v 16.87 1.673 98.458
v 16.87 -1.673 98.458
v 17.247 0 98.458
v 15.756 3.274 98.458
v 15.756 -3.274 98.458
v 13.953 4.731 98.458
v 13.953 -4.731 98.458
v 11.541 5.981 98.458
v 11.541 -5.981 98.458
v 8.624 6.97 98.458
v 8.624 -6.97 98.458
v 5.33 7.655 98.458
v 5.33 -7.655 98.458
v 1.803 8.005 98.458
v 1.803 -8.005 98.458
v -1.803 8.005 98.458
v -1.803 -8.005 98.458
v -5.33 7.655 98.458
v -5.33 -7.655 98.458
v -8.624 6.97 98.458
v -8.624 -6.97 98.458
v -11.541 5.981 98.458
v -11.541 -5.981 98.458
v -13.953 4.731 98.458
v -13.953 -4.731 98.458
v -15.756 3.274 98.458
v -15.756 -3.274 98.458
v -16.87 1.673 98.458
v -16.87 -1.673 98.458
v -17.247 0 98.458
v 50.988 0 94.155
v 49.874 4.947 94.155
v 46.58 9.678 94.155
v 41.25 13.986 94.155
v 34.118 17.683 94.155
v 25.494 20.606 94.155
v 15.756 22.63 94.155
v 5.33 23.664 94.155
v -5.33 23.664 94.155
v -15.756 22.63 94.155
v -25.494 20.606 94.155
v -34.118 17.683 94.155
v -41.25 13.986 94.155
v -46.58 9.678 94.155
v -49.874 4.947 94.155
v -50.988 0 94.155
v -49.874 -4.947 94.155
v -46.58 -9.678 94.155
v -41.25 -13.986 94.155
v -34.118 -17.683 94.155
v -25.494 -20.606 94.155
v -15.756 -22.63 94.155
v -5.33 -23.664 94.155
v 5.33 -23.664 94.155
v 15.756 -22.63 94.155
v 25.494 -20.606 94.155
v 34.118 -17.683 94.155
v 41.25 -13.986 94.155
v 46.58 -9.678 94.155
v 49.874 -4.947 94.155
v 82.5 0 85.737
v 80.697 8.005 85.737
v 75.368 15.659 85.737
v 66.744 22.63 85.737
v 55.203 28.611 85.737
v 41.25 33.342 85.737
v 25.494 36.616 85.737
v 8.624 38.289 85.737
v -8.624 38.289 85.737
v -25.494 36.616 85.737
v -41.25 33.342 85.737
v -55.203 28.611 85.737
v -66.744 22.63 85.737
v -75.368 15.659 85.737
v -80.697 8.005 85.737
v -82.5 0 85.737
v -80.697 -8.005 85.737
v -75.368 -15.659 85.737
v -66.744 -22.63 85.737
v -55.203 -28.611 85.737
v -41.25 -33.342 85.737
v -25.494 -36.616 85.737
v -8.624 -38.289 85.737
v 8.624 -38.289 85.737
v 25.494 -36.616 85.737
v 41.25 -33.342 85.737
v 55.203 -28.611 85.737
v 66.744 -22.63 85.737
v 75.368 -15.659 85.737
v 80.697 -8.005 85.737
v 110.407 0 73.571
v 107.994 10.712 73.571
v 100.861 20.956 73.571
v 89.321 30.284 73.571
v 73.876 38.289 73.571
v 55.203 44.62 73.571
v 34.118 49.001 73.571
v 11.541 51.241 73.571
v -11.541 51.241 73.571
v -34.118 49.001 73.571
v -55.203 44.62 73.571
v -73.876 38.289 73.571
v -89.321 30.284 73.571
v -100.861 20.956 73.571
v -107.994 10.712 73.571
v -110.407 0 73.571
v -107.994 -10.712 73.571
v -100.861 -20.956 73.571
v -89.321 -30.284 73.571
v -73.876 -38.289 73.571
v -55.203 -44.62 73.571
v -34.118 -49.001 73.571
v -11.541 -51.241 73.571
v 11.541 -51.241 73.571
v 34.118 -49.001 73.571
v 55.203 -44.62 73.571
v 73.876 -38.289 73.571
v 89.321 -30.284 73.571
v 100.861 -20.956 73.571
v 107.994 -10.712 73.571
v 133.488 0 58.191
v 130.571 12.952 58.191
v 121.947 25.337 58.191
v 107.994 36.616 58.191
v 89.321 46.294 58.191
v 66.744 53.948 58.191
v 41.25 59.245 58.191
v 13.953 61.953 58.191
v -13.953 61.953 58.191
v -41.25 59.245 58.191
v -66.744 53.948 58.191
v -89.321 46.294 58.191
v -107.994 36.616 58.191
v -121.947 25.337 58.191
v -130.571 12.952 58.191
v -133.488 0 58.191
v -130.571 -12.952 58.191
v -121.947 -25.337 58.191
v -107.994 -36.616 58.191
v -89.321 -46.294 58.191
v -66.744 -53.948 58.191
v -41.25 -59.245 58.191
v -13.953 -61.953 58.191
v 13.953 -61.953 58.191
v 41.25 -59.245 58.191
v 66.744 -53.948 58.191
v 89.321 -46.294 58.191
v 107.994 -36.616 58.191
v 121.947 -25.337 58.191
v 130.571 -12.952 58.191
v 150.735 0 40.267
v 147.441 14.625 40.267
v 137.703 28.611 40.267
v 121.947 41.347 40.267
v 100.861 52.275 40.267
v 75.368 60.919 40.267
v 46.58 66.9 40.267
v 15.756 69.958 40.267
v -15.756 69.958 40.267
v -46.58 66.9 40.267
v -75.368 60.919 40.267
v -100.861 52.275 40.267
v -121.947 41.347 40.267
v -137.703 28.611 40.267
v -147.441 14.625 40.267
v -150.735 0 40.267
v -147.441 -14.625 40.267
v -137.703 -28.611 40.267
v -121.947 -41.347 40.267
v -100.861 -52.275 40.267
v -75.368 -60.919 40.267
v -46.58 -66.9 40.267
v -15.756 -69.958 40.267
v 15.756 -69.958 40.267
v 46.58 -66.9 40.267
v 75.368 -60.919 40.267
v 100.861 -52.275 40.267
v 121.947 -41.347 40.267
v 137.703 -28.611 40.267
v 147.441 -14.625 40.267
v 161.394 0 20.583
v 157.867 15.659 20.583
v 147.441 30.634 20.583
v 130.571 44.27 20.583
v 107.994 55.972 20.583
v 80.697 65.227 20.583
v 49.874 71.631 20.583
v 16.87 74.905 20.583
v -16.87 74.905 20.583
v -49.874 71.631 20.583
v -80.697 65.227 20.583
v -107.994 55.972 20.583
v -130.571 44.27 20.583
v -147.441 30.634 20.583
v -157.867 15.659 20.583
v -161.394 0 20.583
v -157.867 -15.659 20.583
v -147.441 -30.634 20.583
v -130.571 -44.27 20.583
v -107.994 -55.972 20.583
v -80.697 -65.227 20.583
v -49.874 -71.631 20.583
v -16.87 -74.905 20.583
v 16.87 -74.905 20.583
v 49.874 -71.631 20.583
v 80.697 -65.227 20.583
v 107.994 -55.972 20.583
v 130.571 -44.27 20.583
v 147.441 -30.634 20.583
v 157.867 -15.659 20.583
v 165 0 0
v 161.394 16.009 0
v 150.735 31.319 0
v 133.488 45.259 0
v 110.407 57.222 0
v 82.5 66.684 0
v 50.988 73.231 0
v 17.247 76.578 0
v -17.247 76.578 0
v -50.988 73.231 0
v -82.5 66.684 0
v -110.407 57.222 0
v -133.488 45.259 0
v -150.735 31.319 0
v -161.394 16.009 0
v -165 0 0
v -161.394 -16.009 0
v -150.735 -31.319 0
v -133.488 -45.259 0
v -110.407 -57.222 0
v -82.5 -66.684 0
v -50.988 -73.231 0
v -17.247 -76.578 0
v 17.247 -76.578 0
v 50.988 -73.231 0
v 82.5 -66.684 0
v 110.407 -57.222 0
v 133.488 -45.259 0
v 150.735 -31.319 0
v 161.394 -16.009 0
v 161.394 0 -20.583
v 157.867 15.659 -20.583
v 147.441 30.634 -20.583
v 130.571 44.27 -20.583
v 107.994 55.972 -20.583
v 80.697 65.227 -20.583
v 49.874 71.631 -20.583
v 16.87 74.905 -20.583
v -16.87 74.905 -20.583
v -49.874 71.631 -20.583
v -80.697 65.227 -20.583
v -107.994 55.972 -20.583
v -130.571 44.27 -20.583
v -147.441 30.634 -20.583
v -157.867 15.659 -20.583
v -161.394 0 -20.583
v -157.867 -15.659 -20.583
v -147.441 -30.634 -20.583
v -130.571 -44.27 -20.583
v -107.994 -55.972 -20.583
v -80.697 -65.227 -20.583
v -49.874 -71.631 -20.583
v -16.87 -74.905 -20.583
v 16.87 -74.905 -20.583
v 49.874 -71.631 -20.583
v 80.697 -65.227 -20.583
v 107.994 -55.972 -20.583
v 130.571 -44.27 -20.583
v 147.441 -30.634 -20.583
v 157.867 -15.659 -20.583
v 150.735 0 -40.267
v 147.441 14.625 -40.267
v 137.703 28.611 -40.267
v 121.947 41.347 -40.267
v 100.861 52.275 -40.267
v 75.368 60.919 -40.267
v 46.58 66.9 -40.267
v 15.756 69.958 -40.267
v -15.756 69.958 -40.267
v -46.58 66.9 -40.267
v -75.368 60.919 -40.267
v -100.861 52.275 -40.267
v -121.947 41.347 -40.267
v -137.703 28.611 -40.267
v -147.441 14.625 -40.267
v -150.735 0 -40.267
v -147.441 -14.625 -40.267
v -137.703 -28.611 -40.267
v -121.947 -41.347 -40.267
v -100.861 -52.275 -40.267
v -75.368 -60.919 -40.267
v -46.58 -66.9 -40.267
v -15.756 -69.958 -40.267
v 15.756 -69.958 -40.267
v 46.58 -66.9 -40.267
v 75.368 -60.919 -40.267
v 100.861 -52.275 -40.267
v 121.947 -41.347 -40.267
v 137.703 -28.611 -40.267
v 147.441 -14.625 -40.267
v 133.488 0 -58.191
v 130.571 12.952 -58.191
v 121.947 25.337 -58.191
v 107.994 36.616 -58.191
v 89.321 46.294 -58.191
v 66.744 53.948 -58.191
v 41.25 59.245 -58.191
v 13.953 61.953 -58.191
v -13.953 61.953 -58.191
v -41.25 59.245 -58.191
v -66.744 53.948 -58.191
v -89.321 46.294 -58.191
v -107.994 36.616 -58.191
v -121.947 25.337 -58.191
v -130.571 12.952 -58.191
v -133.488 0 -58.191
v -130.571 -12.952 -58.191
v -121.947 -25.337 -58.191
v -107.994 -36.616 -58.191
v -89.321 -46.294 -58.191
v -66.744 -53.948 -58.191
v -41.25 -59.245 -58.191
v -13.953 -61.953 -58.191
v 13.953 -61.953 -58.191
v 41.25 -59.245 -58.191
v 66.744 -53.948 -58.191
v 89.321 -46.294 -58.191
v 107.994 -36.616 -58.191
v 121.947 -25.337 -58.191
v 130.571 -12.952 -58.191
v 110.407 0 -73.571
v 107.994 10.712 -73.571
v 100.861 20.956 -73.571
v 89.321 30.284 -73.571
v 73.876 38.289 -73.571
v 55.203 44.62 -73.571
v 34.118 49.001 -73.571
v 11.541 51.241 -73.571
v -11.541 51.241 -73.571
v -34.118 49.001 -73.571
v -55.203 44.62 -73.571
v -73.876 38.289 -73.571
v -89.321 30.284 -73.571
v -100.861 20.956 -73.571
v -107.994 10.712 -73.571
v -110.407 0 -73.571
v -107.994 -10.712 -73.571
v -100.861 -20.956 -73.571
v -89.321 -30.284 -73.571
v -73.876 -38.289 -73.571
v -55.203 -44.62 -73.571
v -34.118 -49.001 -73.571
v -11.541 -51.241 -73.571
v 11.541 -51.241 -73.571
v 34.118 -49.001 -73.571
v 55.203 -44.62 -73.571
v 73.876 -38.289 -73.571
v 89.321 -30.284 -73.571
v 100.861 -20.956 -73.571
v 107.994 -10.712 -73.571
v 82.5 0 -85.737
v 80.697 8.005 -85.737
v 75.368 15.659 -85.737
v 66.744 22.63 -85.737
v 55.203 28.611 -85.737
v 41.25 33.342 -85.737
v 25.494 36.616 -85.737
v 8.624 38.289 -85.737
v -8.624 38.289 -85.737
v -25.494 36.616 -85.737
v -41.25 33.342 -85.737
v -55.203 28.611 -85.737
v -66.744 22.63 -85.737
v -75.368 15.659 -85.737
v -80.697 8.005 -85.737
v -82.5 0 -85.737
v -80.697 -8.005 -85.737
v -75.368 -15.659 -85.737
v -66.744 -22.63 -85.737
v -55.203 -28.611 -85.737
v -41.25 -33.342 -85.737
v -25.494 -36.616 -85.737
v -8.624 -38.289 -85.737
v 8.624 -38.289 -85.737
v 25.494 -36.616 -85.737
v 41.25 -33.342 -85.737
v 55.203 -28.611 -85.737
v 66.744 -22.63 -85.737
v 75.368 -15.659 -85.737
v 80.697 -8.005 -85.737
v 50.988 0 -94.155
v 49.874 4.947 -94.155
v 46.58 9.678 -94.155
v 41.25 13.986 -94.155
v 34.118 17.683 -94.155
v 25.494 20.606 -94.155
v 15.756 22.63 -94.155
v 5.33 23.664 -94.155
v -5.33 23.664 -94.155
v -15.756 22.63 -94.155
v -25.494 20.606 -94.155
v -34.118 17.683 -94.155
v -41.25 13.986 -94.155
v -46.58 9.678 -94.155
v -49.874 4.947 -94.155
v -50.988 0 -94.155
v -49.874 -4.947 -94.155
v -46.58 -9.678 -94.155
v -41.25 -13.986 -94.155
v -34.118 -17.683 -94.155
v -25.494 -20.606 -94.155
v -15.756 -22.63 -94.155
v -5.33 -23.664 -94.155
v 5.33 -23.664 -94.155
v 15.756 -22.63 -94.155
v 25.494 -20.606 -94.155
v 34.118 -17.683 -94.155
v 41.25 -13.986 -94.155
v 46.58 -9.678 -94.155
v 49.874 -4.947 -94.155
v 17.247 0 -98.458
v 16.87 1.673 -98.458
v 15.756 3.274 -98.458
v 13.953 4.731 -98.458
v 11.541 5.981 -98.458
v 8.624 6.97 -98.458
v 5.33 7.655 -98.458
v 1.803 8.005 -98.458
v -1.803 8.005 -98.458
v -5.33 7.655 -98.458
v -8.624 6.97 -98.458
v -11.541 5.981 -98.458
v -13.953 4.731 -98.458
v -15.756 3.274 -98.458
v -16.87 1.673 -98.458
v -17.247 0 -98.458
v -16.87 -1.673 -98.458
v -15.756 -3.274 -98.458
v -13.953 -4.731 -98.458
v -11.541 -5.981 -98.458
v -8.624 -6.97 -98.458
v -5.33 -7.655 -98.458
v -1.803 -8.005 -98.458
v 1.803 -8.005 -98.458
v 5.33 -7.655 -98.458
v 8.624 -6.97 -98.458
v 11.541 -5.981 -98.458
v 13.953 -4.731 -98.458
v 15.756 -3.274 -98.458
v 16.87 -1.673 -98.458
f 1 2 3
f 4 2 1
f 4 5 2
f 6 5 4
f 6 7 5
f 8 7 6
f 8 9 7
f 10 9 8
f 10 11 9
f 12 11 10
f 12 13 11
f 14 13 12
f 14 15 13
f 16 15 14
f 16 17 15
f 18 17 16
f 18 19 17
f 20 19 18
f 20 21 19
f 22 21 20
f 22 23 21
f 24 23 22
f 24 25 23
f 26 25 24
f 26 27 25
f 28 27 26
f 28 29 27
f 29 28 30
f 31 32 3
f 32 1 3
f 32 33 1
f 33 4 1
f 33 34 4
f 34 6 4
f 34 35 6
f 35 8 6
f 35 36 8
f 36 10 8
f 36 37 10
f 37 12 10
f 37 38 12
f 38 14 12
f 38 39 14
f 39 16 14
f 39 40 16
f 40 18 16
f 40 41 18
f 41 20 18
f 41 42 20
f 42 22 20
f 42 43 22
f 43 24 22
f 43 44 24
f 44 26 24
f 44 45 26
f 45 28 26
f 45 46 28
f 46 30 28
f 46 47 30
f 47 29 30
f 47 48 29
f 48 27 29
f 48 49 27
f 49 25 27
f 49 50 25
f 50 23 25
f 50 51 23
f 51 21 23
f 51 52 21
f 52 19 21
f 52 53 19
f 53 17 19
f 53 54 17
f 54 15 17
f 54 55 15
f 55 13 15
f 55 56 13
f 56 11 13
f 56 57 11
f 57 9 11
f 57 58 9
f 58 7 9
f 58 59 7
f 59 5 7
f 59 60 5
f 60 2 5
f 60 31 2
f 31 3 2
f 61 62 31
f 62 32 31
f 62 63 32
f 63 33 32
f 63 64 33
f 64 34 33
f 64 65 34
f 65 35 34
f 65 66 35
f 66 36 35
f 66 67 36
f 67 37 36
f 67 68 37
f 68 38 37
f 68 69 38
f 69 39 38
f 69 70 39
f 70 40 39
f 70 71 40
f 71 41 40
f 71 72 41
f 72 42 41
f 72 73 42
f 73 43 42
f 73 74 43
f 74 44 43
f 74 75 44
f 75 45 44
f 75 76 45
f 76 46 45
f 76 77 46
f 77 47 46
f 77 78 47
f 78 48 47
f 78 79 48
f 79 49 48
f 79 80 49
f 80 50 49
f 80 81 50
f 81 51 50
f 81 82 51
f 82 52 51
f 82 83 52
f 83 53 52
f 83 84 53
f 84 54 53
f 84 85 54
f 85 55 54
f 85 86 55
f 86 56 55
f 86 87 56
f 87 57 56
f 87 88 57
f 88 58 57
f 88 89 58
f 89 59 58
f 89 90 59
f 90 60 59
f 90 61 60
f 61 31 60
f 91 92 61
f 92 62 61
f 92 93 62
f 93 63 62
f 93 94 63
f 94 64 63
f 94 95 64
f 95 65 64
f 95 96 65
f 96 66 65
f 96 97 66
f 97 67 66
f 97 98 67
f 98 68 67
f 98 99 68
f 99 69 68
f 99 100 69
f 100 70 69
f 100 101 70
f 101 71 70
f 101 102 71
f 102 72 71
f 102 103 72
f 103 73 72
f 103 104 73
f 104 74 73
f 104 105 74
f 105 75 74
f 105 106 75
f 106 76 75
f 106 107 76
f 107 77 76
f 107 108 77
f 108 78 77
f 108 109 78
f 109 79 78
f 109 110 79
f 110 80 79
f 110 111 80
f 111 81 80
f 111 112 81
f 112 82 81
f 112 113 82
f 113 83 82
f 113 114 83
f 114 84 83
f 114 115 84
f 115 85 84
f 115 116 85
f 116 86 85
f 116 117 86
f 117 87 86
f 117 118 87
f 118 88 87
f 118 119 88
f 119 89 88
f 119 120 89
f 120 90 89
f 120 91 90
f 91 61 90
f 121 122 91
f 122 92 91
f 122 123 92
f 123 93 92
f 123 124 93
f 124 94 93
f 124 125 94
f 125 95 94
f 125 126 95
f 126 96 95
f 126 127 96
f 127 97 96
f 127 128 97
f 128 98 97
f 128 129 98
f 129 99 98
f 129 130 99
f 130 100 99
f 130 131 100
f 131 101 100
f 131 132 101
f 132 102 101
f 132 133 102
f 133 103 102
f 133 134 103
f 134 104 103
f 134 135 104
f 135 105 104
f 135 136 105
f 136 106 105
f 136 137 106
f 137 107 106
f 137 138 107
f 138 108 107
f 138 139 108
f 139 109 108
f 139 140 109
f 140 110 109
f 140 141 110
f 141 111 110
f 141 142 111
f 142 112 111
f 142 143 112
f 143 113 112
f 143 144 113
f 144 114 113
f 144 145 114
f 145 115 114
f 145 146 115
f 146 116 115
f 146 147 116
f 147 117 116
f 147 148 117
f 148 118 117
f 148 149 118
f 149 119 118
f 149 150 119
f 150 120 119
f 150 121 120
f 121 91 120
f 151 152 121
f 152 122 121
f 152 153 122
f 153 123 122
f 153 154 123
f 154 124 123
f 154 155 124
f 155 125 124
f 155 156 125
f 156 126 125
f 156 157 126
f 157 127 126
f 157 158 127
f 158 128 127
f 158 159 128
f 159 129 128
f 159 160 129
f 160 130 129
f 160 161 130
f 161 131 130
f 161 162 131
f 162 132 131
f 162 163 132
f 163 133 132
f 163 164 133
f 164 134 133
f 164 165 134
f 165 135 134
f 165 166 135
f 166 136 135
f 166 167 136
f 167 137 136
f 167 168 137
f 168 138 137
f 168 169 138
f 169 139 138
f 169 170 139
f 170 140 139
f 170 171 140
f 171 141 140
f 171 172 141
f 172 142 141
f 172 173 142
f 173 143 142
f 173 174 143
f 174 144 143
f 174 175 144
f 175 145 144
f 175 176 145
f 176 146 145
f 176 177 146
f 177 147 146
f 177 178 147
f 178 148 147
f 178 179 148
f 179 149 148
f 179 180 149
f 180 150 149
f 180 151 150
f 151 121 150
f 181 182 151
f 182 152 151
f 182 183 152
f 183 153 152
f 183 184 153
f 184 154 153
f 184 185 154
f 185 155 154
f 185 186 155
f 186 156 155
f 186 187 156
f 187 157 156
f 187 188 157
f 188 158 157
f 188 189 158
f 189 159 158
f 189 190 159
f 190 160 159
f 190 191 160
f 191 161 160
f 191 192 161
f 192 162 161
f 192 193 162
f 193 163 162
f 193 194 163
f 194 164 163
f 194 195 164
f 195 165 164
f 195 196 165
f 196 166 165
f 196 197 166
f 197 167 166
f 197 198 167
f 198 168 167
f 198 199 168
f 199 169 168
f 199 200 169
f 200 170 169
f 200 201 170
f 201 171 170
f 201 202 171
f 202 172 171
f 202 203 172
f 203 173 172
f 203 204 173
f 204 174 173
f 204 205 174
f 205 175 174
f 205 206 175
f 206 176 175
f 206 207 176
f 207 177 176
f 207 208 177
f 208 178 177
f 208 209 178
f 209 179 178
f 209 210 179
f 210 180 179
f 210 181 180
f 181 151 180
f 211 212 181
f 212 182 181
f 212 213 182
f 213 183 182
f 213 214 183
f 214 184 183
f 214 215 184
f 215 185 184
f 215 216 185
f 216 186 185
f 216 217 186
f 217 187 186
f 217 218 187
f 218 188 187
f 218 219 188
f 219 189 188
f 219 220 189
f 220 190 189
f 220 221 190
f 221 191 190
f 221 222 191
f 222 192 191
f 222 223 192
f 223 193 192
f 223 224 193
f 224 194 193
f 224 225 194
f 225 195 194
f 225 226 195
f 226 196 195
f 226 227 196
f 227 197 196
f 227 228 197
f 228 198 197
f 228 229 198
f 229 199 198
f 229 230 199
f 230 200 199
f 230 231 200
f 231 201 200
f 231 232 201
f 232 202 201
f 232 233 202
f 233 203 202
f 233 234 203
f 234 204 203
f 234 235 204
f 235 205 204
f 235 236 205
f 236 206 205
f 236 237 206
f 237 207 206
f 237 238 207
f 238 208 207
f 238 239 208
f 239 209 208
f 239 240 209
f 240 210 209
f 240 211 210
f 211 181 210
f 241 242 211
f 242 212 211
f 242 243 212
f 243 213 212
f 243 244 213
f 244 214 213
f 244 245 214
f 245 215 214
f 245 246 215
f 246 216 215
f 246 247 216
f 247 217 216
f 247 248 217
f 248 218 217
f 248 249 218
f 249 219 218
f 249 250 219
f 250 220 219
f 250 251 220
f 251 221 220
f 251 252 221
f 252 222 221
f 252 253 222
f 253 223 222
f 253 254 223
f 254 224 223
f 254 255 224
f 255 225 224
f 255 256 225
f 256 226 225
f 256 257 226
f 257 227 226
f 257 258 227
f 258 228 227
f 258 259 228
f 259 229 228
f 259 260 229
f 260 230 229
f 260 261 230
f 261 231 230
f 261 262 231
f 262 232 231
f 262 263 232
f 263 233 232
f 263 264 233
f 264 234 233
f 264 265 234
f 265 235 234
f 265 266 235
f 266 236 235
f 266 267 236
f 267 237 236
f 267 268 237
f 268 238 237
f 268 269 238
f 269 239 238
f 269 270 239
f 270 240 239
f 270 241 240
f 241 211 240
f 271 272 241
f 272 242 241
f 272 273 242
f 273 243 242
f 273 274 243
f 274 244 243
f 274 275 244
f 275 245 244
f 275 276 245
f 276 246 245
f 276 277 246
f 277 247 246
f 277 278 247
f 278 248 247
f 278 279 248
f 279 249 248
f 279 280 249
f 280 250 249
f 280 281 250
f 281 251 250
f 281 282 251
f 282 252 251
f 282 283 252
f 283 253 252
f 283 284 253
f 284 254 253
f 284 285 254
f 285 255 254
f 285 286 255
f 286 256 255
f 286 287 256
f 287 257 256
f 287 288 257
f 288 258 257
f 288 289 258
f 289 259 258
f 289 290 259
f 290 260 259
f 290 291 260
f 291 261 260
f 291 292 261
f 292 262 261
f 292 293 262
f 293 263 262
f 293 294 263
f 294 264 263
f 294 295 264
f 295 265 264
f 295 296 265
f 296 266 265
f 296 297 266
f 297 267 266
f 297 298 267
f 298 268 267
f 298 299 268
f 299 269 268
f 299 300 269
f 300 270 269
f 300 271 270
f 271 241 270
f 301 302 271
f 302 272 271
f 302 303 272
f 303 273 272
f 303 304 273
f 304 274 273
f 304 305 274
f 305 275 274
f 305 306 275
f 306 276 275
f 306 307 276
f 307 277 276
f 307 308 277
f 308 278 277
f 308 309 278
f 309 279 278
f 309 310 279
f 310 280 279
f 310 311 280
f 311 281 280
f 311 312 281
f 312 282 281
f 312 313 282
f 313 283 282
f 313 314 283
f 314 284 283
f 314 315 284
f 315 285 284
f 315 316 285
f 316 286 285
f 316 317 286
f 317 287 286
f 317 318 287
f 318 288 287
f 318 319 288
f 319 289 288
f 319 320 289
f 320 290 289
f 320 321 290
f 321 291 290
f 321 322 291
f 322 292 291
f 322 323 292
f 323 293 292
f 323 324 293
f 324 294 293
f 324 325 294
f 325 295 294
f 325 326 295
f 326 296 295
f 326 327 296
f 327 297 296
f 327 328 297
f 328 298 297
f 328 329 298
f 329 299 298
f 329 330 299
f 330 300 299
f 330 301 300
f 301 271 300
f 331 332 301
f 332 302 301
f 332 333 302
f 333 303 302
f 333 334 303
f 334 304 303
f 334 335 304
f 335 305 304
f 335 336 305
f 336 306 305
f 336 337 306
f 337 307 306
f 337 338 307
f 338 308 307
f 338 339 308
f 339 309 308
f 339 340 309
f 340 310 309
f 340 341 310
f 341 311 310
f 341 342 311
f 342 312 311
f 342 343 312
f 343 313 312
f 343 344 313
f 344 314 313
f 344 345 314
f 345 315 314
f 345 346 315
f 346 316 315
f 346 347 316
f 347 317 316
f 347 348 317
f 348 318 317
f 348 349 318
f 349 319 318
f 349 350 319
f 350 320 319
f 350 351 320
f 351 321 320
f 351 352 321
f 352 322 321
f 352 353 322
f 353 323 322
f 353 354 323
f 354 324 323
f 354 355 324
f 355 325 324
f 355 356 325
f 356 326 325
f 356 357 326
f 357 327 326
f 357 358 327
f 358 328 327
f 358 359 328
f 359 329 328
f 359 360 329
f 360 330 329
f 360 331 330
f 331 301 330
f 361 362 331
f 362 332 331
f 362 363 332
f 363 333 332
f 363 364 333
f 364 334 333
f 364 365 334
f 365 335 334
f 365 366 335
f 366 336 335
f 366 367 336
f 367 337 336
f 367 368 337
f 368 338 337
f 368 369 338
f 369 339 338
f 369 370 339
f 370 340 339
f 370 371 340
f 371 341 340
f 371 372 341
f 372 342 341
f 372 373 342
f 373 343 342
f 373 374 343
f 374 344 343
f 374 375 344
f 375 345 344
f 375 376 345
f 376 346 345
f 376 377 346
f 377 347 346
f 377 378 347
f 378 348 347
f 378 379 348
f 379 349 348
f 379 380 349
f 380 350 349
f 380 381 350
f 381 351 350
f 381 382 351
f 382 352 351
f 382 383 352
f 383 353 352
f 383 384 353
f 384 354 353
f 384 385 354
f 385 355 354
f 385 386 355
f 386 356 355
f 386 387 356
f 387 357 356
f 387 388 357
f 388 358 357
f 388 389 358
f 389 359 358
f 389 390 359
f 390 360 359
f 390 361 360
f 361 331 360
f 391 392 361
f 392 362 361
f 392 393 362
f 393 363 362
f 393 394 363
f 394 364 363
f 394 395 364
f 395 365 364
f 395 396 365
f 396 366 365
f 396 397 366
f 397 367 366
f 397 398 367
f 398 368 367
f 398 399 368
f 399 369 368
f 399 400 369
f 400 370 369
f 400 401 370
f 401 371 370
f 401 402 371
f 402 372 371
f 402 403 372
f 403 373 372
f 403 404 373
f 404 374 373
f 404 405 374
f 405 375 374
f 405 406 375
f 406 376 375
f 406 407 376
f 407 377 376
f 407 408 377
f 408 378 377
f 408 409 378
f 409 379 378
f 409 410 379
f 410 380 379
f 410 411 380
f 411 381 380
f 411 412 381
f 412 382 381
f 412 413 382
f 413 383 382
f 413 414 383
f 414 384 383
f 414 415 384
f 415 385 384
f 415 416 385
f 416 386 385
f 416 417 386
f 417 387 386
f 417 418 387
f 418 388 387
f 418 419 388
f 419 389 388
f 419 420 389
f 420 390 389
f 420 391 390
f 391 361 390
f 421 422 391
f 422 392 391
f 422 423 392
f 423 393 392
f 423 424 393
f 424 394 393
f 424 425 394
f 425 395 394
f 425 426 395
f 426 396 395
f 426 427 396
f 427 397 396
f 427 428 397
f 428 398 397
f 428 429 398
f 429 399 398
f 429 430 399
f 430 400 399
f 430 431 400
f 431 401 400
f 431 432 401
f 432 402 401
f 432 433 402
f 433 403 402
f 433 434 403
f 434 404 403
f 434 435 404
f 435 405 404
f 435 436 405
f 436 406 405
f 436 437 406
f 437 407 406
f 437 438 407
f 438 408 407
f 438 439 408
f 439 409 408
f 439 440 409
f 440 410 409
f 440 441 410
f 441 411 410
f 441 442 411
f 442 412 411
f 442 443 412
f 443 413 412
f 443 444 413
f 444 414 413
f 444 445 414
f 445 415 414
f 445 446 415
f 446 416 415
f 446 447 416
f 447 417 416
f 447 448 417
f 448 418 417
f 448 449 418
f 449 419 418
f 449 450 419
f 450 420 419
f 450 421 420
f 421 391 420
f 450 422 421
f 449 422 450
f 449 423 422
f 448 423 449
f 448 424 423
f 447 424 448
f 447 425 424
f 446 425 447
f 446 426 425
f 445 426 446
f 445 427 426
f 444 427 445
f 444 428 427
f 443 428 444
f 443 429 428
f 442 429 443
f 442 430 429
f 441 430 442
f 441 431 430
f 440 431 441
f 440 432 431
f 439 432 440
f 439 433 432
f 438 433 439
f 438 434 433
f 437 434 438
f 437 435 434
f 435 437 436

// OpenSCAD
// Generated by SolidPython 1.0.1 on 2020-07-29 00:46:51


scale(v = [15, 7, 9]) {
	sphere(r = 11);
}
/***********************************************
*********      SolidPython code:      **********
************************************************
 
# import packages: SolidPython
from solid import *
from solid.utils import *
from itertools import chain, combinations, permutations


class Resize:

    def __init__(self, scad_file):
        self.scad_file = scad_file
        #self.scad_file = import_scad(scad_file)
        # cone/cylinder param:
        self.r1 = 0
        self.r2 = 0
        self.h = 0
        # rectangular prism param:
        self.w = 0
        self.l = 0
        # ellipse param:
        self.r = 0

    # import OpenScad code (file name corresponds to shape)


    # classify shape + parameters
    def assign(self, param1, param2, param3):
        if self.scad_file == 'cone.scad':
            self.r1 = param1
            self.r2 = param2
            self.h = param3
        elif self.scad_file == 'cylinder.scad':
            self.r1 = param1
            self.r2 = param2
            self.h = param3
        elif self.scad_file == 'rectangularPrism.scad':
            self.h = param1
            self.l = param2
            self.w = param3
        else:
            self.r = param1
            self.h = param2

    # resize parameters
    def iterate(self):
        x = range(3, 20, 2)
        i = 1
        if self.scad_file == 'cone.scad':
            tempList = list(permutations(x, 2))
            for temp in tempList:
                param1 = temp[0]
                param2 = temp[1]
                filepath = 'produced_scad_files/' + 'cone' + str(param1) + '_' + str(param2) + '_' + '.scad'
                scad_render_to_file(cylinder(h=param1, r1=param2, r2=0), filepath)

        elif self.scad_file == 'cylinder.scad':
            tempList = list(permutations(x, 3))
            for temp in tempList:
                param1 = temp[0]
                param2 = temp[1]
                filepath = 'produced_scad_files/' + 'cylinder' + str(param1) + '_' + str(param2) + '_' + '.scad'
                scad_render_to_file(cylinder(h=param1, r1=param2, r2=param2), filepath)

        elif self.scad_file == 'rectangularPrism.scad':
            tempList = list(permutations(x, 3))
            for temp in tempList:
                param1 = temp[0]
                param2 = temp[1]
                param3 = temp[2]
                filepath = 'produced_scad_files/' + 'rectangularPrism' + str(param1) + '_' + str(param2) + '_' + str(
                    param3) + '.scad'
                scad_render_to_file(cube(size=(param1, param2, param3)), filepath)

        elif self.scad_file == 'ellipse.scad':
            tempList = list(permutations(x, 4))
            for temp in tempList:
                param1 = temp[0]
                param2 = temp[1]
                param3 = temp[2]
                param4 = temp[3]
                filepath = 'produced_scad_files/' + 'ellipse' + str(param1) + '_' + str(param2) + '_' + str(param3) + '_' + str(param4) + '.scad'
                scad_render_to_file(scale([param1, param2, param3])(sphere(r=param4)), filepath)

    def render_to_scadfile(self):
        scad_render_to_file(scad, 'example.scad') 
 
************************************************/
